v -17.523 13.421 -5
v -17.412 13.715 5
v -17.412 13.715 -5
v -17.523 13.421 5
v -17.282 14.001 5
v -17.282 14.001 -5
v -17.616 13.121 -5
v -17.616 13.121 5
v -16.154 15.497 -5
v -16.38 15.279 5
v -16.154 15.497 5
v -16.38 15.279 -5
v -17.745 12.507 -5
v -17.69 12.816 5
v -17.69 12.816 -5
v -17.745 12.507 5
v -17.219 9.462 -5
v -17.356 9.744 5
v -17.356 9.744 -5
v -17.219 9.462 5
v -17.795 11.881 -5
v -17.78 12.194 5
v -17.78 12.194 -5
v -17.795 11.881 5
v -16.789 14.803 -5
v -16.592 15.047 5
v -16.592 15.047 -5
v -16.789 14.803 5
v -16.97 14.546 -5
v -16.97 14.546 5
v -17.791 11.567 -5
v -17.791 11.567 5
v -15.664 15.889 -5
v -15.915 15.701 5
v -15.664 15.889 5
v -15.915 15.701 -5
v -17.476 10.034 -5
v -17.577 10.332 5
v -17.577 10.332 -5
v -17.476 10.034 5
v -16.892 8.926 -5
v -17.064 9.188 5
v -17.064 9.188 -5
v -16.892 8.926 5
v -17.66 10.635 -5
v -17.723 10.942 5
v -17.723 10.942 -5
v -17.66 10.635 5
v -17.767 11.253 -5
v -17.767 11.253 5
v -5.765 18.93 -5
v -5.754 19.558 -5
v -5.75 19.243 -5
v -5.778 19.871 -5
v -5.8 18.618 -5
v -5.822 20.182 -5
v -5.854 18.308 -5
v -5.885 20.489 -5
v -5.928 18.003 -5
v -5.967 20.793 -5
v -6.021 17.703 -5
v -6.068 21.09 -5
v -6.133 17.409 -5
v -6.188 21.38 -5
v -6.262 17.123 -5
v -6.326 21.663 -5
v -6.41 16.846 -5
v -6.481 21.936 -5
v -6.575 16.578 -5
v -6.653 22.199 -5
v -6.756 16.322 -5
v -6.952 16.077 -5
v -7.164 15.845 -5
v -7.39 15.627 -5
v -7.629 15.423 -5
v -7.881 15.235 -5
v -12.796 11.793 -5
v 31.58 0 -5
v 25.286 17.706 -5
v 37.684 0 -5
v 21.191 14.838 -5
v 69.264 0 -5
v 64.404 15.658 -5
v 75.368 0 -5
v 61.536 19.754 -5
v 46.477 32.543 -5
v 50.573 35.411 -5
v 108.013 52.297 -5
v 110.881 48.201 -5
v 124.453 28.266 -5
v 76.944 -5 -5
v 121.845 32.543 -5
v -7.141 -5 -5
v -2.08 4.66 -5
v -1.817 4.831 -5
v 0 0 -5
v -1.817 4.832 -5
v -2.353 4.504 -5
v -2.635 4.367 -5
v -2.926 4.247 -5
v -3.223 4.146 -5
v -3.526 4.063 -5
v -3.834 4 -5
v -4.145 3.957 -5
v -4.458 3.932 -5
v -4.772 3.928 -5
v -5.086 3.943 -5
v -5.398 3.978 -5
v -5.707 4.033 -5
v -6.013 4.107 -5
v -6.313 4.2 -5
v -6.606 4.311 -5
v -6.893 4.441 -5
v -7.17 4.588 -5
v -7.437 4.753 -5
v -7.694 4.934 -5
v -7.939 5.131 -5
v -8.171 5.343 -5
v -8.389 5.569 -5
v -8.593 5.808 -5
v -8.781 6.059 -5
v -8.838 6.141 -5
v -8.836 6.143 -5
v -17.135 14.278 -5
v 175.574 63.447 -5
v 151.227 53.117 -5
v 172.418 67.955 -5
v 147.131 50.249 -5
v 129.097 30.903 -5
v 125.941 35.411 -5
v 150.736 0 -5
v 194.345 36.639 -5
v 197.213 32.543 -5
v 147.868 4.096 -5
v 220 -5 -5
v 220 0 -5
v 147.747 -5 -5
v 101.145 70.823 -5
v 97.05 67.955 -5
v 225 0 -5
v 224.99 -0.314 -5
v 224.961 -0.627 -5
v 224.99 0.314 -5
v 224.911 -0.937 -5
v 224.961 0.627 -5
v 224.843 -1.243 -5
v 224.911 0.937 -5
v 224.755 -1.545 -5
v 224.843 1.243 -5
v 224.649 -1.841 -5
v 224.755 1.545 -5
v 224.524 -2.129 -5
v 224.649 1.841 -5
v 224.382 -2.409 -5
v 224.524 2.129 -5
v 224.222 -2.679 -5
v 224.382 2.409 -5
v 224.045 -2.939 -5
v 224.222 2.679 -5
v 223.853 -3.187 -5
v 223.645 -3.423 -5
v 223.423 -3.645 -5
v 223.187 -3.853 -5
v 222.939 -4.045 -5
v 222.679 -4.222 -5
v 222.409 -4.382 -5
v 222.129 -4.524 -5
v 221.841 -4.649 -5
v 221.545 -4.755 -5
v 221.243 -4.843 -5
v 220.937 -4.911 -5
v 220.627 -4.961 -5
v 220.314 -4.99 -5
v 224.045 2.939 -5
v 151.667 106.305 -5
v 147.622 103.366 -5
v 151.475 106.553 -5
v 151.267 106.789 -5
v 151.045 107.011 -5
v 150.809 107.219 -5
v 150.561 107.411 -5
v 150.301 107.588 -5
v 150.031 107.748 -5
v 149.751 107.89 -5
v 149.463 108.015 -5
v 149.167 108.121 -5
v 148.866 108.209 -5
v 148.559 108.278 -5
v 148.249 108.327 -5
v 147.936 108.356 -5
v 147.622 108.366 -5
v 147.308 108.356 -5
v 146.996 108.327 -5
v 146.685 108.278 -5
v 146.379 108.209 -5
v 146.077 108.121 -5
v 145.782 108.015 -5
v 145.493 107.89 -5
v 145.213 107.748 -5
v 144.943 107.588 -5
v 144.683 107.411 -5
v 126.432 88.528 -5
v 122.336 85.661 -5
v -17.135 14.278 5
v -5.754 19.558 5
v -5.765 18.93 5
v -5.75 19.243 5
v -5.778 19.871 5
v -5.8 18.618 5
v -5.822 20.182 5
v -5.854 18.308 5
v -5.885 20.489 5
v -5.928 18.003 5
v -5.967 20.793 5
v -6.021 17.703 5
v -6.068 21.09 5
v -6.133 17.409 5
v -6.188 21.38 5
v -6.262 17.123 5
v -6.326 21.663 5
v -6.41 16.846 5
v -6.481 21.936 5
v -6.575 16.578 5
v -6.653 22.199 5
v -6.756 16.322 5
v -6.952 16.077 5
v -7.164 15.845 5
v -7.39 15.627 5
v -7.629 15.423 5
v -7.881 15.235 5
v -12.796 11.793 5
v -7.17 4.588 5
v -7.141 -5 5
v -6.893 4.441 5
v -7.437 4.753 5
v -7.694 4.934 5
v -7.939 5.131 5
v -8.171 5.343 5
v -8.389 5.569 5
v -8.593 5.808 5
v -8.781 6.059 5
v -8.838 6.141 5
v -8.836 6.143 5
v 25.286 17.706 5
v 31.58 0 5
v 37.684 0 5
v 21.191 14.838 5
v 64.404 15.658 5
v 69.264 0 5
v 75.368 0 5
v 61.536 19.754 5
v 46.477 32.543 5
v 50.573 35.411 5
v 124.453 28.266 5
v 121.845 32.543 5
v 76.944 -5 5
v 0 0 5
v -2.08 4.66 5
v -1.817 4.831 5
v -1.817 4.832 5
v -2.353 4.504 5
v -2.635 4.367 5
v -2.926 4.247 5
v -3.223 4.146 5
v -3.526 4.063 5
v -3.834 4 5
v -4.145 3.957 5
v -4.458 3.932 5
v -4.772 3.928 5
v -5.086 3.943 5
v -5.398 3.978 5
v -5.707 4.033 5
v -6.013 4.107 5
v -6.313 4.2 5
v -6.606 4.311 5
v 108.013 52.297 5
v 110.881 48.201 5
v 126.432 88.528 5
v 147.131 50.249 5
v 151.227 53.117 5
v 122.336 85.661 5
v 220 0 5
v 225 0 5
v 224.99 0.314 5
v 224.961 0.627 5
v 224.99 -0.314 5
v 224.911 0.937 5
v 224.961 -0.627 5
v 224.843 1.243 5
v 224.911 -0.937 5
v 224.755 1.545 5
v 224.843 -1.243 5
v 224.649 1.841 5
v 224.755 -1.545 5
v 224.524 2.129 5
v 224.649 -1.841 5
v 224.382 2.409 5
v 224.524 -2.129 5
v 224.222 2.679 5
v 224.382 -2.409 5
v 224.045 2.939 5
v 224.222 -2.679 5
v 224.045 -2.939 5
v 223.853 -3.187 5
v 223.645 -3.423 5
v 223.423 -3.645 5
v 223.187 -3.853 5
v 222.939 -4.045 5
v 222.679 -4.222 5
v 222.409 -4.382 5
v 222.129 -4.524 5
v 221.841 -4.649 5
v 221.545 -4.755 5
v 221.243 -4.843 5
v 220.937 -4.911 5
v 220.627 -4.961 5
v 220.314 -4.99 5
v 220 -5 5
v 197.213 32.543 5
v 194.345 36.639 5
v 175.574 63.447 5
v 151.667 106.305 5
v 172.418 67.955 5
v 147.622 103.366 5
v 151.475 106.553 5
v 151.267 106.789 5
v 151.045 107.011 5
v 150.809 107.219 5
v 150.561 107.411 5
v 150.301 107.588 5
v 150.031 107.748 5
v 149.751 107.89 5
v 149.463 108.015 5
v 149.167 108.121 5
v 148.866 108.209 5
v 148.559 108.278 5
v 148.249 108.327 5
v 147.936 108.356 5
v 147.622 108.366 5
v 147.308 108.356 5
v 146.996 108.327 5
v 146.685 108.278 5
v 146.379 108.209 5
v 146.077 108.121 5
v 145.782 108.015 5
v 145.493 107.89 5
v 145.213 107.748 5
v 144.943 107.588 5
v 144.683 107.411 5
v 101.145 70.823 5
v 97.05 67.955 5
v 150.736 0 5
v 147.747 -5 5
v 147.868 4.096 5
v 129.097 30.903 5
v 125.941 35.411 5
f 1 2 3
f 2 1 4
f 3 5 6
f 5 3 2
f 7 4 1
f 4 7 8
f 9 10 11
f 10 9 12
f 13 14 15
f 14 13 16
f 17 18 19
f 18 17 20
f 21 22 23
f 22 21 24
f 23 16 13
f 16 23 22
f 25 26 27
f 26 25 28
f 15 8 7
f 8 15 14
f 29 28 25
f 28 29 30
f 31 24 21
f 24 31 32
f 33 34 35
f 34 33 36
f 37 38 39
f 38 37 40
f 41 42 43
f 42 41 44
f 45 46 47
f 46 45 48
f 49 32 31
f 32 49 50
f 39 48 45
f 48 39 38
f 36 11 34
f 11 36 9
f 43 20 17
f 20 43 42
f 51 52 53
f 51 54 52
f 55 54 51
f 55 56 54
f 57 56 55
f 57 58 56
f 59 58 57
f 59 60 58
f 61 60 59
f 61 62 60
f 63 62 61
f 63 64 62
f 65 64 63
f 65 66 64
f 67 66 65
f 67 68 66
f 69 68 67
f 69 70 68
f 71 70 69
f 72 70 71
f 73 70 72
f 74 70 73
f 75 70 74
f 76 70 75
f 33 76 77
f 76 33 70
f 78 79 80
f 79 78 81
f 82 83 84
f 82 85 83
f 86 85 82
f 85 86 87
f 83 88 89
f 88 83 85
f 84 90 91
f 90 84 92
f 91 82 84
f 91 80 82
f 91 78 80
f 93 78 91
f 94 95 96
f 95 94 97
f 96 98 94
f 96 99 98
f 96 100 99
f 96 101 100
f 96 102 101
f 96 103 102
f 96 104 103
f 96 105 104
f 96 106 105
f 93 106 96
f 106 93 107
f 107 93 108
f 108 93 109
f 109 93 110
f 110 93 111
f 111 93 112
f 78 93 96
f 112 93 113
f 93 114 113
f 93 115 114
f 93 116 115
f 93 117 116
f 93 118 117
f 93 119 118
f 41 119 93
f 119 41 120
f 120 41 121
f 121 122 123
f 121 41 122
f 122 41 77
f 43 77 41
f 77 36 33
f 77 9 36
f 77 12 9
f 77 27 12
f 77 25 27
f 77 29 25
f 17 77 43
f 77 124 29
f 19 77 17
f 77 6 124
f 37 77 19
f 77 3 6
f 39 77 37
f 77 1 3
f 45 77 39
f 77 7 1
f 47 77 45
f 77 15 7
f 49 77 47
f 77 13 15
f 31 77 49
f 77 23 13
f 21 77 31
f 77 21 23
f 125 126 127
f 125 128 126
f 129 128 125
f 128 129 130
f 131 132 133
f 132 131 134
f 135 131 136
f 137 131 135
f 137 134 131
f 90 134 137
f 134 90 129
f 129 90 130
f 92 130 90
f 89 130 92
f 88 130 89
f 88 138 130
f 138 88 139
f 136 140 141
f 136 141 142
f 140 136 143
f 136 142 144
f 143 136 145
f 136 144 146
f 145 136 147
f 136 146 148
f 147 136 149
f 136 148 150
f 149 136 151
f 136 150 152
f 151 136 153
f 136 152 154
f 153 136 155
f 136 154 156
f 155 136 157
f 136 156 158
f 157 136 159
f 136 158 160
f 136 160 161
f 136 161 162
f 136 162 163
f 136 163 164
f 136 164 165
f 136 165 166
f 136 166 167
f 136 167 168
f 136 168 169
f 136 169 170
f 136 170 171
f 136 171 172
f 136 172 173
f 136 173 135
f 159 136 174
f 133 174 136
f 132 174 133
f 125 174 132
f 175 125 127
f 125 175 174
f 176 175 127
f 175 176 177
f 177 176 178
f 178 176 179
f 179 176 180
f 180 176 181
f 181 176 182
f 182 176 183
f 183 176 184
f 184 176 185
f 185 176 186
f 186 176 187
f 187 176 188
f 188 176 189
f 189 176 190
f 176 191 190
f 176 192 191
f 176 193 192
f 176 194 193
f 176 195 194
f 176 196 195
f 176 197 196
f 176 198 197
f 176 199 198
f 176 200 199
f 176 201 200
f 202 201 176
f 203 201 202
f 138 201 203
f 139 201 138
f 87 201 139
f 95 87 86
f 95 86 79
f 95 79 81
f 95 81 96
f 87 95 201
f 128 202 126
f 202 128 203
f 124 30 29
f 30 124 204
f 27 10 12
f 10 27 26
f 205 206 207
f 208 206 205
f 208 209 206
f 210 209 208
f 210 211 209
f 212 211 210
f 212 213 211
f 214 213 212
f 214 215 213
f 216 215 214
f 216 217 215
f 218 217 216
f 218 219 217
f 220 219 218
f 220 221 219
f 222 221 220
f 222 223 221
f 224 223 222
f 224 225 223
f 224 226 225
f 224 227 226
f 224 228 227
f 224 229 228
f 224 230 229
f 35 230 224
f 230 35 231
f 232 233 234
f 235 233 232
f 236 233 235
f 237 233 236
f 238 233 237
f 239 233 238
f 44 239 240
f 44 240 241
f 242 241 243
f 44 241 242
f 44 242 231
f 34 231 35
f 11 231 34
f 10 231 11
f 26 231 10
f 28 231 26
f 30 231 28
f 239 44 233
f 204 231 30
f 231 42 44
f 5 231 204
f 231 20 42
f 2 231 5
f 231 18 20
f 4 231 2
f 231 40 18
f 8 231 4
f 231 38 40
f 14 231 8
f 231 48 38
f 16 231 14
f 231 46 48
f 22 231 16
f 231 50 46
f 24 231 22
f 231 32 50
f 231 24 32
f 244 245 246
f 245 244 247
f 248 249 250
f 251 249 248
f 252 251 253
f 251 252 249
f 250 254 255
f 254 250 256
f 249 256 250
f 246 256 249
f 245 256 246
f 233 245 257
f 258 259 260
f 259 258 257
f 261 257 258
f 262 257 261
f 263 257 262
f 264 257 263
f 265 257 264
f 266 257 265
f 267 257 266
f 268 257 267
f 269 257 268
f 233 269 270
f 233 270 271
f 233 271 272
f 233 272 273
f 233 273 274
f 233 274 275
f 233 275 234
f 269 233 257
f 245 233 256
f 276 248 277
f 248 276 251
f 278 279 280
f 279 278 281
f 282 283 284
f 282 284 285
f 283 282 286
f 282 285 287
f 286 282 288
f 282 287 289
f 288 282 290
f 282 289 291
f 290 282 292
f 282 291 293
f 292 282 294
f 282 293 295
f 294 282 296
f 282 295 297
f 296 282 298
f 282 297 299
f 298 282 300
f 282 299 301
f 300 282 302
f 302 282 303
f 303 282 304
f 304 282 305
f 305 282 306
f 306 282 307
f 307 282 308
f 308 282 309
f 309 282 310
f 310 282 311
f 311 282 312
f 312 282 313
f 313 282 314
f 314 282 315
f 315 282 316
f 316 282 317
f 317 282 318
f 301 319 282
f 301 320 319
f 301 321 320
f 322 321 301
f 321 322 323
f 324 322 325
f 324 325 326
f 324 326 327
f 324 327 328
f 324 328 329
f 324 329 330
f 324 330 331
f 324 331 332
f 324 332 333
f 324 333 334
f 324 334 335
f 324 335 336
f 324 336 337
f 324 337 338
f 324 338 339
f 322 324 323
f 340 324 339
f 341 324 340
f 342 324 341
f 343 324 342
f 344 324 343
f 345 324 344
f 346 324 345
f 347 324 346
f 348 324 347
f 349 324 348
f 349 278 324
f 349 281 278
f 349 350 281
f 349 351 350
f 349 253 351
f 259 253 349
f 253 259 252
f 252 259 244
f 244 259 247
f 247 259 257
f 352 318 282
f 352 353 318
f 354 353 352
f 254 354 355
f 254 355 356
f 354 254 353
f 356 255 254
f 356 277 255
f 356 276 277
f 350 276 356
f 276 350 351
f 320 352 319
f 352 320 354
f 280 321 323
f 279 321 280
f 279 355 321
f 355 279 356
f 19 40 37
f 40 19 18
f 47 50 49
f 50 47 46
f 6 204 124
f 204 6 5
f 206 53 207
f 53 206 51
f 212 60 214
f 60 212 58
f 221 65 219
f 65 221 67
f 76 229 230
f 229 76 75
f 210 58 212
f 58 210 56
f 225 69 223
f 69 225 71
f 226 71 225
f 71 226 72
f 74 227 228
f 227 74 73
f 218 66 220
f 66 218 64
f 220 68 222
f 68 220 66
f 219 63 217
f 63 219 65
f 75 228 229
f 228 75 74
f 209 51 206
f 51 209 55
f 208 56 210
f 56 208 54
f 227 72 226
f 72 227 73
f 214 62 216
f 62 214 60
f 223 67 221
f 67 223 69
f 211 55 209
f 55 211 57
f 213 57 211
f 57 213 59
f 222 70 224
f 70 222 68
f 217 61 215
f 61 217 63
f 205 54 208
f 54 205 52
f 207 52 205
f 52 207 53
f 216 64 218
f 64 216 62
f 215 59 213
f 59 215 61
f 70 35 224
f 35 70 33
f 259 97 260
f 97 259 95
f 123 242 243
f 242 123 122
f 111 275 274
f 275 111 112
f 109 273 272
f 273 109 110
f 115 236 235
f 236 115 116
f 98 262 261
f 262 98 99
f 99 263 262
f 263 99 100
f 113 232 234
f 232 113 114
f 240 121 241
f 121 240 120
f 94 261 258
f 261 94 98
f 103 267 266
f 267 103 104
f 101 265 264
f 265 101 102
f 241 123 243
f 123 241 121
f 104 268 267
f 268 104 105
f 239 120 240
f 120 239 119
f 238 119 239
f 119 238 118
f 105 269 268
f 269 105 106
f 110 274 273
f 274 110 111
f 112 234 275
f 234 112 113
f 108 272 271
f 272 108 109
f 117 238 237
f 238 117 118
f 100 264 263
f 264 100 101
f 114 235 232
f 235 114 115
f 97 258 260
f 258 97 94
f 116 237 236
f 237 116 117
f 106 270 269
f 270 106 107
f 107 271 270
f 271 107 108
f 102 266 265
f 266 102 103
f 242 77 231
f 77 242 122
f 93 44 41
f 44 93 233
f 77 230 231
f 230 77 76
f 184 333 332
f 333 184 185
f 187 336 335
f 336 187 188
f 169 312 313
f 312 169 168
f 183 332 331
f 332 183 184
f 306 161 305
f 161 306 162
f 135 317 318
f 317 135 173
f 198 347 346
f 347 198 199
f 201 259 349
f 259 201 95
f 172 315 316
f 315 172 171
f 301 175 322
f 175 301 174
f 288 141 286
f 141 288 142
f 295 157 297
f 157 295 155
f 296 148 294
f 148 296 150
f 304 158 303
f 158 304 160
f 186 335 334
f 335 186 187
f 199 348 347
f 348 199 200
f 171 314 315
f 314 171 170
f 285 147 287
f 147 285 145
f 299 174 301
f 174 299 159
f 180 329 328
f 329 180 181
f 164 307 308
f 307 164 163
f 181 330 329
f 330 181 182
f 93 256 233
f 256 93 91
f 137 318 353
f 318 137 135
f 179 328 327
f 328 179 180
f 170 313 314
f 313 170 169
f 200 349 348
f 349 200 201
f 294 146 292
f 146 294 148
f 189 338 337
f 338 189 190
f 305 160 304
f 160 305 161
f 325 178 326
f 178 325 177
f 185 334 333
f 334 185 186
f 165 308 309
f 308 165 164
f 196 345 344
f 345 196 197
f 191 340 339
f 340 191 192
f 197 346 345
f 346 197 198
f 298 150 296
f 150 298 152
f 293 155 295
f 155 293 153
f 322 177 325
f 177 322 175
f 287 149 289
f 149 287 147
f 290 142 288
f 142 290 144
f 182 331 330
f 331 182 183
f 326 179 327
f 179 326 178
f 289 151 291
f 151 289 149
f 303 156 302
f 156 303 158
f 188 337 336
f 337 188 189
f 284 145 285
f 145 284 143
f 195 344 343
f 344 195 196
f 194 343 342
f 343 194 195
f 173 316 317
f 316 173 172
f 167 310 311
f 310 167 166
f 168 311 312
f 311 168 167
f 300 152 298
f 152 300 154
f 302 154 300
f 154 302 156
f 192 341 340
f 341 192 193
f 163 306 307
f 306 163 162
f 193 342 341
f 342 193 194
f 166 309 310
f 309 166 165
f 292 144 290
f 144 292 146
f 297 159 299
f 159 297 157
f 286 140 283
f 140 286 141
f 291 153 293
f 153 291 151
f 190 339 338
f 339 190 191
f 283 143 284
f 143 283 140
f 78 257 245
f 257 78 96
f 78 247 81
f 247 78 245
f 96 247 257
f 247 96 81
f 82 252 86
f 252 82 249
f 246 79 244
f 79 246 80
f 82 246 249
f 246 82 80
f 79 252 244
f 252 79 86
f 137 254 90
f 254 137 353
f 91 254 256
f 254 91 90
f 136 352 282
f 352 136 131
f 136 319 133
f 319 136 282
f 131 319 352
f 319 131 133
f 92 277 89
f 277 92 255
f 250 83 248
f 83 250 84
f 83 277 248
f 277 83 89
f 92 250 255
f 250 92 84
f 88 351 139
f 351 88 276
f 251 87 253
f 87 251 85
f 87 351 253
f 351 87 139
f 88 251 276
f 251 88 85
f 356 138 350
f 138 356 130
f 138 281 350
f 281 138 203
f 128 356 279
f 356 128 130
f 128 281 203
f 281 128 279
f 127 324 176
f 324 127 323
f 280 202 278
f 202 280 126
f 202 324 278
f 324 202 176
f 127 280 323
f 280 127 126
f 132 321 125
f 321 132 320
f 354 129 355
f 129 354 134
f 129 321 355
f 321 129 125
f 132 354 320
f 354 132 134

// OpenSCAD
$fn=100;

*translate(-[ 18.45, 25.08, 70 ])import("GeomStandBig.stl");



//configure     default Vals MacBook Retina 15"
//roundings = 5;  //  5 
//Wall thickness (mm)
wallThick = 5;  // [2:8]

//Angle (Deg)
angleDeg = 35;  // [15:50]

//Deepnes of the base(mm)
baseDeep = 220; // 

//Width of the Stand(mm)
standWidth = 10;// [2:20]

//Spacing of the Hook(mm)
hookSpace = 12; // [5:20]

// Length of the Hook(mm). Zero = No Hook
hookLen = 6;   // [30]

/* [Hidden] */
fudge = 0.1;    //0.1

subDivs = 6;

surfaceLen = cos(angleDeg) * baseDeep;
topXCord = pow(surfaceLen,2)/baseDeep;
topYCord = sqrt((baseDeep-topXCord)*topXCord);


fieldWdth = (surfaceLen-(subDivs-1)*wallThick)/subDivs;
echo(surfaceLen,fieldWdth);
echo(norm([ 144.02, 100.45, 5.00 ]));

// triangle calculations
// tan alpha = GK/AK
// cos alpha = AK/HYP
// sin alpha = GK/HYP
// b²=c*q
// a²+b²=c²
dFieldWdth = fieldWdth*2+wallThick; //double field width (adjactence side)
GK = tan(angleDeg)*fieldWdth; //opposite width of triangle to remove

dGK = tan(angleDeg)* dFieldWdth; //opposite width of the large triangle
dAK = dFieldWdth;
dHYP = dGK / sin(angleDeg); //hypotenuse width of large triangle

HYP1 = sqrt(pow(fieldWdth,2)+pow(GK,2)); //The hypotenuse of the triangle to remove
HYP2 = wallThick / cos(angleDeg);  //the hypotenuse of the small wall base, width to next triangle
GK2 = sqrt(pow(HYP2,2)-pow(wallThick,2)); //opposite width of the small tri at the base f the wall
GK3 = sin(angleDeg)*wallThick; //opposite width of small tri at the rightmost triangle
AK3 = cos(angleDeg)*wallThick;

GK4 = wallThick-AK3+fudge; //very small Tri at opener
HYP4 = GK4/sin(angleDeg);
AK4 = cos(angleDeg) * HYP4;

AK5 = GK4;
HYP5 = AK5/cos(angleDeg);

Hg = sin(angleDeg)*dFieldWdth;
q = Hg+wallThick/tan(angleDeg);
echo(GK3);
    

//base geometry
//big one
difference(){
union(){
    hull(){
        cylinder(h=standWidth,r=wallThick, center=true);
        translate ([baseDeep,0,0]) 
            cylinder(h=standWidth,r=wallThick, center=true);
        translate ([topXCord,topYCord,0]) 
            cylinder(h=standWidth,r=wallThick, center=true);
    }

    //get translation for the hook in X dir
    AK=wallThick/tan(angleDeg);

    translate([-AK,-wallThick,-standWidth/2])
        rotate([0,0,angleDeg])       
            hook();
    translate([-AK,-wallThick,-standWidth/2]) 
        cube([AK,wallThick,standWidth]);
}


// now the recesses 
//polys
    //#1
    rotate([0,0,angleDeg]) linear_extrude(height=standWidth+fudge,center=true) polygon([[0,0],[fieldWdth,0],[fieldWdth,-GK]]);
    //#2 (tri+quad)
    translate ([HYP1+HYP2,0,0]) 
        rotate([0,0,angleDeg]) 
        linear_extrude(height=standWidth+fudge,center=true) 
            polygon([[0,0],[0,GK+GK2],[fieldWdth,GK+GK2],[fieldWdth,0],[fieldWdth,-GK]]);
    //#3 (double, opens at bottom)
    //#translate ([(HYP1+HYP2)*2+GK3,-AK3,0]) 
    translate ([(HYP1+HYP2)*2+GK3-AK4,-wallThick-fudge,0]) 
        rotate([0,0,angleDeg]) 
        linear_extrude(height=standWidth+fudge,center=true) 
            polygon([[0,0],[dFieldWdth+AK4,0],[dFieldWdth+AK4,-dGK-HYP5]]);

    //#4 (double)
    translate ([(HYP1+HYP2)*4,0,0]) rotate([0,0,angleDeg]) 
        linear_extrude(height=standWidth+fudge,center=true) 
            polygon([[0,0],[dFieldWdth,0],[dFieldWdth,-dGK]]);
            
//now the rectangles
    recDepth2=2*(GK+GK2);
    //#1
    translate([(HYP1+HYP2)*2,0,-(standWidth+fudge)/2])
        rotate([0,0,angleDeg]) cube([dFieldWdth,(recDepth2-wallThick)/2,standWidth+fudge]);
    //#2
    translate([(HYP1+HYP2)*2,0,-(standWidth+fudge)/2])
        rotate([0,0,angleDeg]) 
            translate([0,(recDepth2-wallThick)/2+wallThick,0])cube([dFieldWdth,(recDepth2-wallThick)/2,standWidth+fudge]);
    //#3
    translate([(HYP1+HYP2)*4,0,-(standWidth+fudge)/2])rotate([0,0,angleDeg]) 
        translate([0,dGK+GK2,0])cube([fieldWdth,recDepth2,standWidth+fudge]);
        
 
    //#4
    translate([(HYP1+HYP2)*5,0,-(standWidth+fudge)/2])rotate([0,0,angleDeg]) 
        translate([0,dGK+GK2+GK+GK2,0])cube([fieldWdth,recDepth2,standWidth+fudge,]);
        
    //#5
    translate([(HYP1+HYP2)*4-GK3,AK3,-(standWidth+fudge)/2]) rotate([0,0,angleDeg]) 
        translate([0,0,0])cube([fieldWdth*2+wallThick,2*GK-GK2,standWidth+fudge,]);
   
    
}
// the small one
*color("red")
    translate([0,0,20])
    difference(){
        union(){
            hull(){
                cylinder(h=standWidth,r=wallThick, center=true);
                translate ([2*HYP1+HYP2,0,0]) 
                    cylinder(h=standWidth,r=wallThick, center=true);
                rotate([0,0,angleDeg])
                translate ([surfaceLen*(2/subDivs)-wallThick/2,0,0]) 
                    cylinder(h=standWidth,r=wallThick, center=true);
            }

            //get translation for the hook in X dir
            AK=wallThick/tan(angleDeg);

            translate([-AK,-wallThick,-standWidth/2])
                rotate([0,0,angleDeg])       
                    hook();
            translate([-AK,-wallThick,-standWidth/2]) 
                cube([AK,wallThick,standWidth]);
        }
        //#1
        rotate([0,0,angleDeg]) linear_extrude(height=standWidth+fudge,center=true) polygon([[0,0],[fieldWdth,0],[fieldWdth,-GK]]);
        
        //#2 (tri+quad)
        translate ([HYP1+HYP2,0,0]) 
            rotate([0,0,angleDeg]) 
            linear_extrude(height=standWidth+fudge,center=true) 
                polygon([[0,0],[0,GK+GK2],[fieldWdth,GK+GK2],[fieldWdth,0],[fieldWdth,-GK]]);
    }


module hook(){

    union(){
        cube([wallThick,hookSpace+wallThick,standWidth]);
        translate([wallThick,hookSpace+wallThick,0])
            intersection(){
                cylinder(h=standWidth,r=wallThick, center=false);
                translate([-wallThick-fudge,0,-fudge/2]) cube([wallThick+fudge,wallThick+fudge,standWidth+fudge]);
            }
        if (hookLen) translate([wallThick,hookSpace+wallThick,0]) cube([hookLen,wallThick,standWidth]);
        if (hookLen) translate([wallThick+hookLen,hookSpace+wallThick*2,0]) 
            intersection(){
            cylinder(h=standWidth,r=wallThick, center=false);
                translate([0,-wallThick-fudge,-fudge/2]) cube([wallThick+fudge,wallThick+fudge,standWidth+fudge]);
            }
        translate([wallThick*2,2*wallThick,0]) 
            difference(){
                translate([-wallThick-fudge,-2*wallThick,0]) cube([wallThick+fudge,2*wallThick+fudge,standWidth]);
                translate([0,0,-fudge/2]) cylinder(h=standWidth+fudge,r=wallThick, center=false);
            }
    }
}
